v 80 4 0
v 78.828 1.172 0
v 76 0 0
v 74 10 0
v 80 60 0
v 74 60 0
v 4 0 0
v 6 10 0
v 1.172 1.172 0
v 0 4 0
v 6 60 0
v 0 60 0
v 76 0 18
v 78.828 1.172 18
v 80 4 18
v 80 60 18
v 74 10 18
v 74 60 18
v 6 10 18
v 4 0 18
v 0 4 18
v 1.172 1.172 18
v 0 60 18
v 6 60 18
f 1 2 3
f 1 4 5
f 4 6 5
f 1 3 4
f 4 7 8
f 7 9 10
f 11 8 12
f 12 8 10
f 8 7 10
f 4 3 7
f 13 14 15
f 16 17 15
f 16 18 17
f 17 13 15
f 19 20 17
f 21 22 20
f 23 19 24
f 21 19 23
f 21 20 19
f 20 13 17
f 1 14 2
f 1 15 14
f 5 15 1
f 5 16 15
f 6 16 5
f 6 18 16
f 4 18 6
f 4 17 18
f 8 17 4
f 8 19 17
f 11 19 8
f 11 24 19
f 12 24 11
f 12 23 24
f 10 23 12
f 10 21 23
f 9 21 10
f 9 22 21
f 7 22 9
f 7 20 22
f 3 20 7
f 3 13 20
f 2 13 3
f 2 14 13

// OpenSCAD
$fn = 32;

// ----------------------------------------------------------------------
// Heat sink frame: 80 x 60 mm frame, 6 mm walls
// ----------------------------------------------------------------------

// --- parameters (mm) ---
profile_height = 18;      // extrusion height
profile_points = 12;      // points of the closed outline

profile = [[0, 4], [1.172, 1.172], [4, 0], [76, 0], [78.828, 1.172], [80, 4], [80, 60], [74, 60], [74, 10], [6, 10], [6, 60], [0, 60]];  // single closed polygon, 12 points, counter clockwise

// --- the one profile operation ---
linear_extrude(height = profile_height) polygon(points = profile);
